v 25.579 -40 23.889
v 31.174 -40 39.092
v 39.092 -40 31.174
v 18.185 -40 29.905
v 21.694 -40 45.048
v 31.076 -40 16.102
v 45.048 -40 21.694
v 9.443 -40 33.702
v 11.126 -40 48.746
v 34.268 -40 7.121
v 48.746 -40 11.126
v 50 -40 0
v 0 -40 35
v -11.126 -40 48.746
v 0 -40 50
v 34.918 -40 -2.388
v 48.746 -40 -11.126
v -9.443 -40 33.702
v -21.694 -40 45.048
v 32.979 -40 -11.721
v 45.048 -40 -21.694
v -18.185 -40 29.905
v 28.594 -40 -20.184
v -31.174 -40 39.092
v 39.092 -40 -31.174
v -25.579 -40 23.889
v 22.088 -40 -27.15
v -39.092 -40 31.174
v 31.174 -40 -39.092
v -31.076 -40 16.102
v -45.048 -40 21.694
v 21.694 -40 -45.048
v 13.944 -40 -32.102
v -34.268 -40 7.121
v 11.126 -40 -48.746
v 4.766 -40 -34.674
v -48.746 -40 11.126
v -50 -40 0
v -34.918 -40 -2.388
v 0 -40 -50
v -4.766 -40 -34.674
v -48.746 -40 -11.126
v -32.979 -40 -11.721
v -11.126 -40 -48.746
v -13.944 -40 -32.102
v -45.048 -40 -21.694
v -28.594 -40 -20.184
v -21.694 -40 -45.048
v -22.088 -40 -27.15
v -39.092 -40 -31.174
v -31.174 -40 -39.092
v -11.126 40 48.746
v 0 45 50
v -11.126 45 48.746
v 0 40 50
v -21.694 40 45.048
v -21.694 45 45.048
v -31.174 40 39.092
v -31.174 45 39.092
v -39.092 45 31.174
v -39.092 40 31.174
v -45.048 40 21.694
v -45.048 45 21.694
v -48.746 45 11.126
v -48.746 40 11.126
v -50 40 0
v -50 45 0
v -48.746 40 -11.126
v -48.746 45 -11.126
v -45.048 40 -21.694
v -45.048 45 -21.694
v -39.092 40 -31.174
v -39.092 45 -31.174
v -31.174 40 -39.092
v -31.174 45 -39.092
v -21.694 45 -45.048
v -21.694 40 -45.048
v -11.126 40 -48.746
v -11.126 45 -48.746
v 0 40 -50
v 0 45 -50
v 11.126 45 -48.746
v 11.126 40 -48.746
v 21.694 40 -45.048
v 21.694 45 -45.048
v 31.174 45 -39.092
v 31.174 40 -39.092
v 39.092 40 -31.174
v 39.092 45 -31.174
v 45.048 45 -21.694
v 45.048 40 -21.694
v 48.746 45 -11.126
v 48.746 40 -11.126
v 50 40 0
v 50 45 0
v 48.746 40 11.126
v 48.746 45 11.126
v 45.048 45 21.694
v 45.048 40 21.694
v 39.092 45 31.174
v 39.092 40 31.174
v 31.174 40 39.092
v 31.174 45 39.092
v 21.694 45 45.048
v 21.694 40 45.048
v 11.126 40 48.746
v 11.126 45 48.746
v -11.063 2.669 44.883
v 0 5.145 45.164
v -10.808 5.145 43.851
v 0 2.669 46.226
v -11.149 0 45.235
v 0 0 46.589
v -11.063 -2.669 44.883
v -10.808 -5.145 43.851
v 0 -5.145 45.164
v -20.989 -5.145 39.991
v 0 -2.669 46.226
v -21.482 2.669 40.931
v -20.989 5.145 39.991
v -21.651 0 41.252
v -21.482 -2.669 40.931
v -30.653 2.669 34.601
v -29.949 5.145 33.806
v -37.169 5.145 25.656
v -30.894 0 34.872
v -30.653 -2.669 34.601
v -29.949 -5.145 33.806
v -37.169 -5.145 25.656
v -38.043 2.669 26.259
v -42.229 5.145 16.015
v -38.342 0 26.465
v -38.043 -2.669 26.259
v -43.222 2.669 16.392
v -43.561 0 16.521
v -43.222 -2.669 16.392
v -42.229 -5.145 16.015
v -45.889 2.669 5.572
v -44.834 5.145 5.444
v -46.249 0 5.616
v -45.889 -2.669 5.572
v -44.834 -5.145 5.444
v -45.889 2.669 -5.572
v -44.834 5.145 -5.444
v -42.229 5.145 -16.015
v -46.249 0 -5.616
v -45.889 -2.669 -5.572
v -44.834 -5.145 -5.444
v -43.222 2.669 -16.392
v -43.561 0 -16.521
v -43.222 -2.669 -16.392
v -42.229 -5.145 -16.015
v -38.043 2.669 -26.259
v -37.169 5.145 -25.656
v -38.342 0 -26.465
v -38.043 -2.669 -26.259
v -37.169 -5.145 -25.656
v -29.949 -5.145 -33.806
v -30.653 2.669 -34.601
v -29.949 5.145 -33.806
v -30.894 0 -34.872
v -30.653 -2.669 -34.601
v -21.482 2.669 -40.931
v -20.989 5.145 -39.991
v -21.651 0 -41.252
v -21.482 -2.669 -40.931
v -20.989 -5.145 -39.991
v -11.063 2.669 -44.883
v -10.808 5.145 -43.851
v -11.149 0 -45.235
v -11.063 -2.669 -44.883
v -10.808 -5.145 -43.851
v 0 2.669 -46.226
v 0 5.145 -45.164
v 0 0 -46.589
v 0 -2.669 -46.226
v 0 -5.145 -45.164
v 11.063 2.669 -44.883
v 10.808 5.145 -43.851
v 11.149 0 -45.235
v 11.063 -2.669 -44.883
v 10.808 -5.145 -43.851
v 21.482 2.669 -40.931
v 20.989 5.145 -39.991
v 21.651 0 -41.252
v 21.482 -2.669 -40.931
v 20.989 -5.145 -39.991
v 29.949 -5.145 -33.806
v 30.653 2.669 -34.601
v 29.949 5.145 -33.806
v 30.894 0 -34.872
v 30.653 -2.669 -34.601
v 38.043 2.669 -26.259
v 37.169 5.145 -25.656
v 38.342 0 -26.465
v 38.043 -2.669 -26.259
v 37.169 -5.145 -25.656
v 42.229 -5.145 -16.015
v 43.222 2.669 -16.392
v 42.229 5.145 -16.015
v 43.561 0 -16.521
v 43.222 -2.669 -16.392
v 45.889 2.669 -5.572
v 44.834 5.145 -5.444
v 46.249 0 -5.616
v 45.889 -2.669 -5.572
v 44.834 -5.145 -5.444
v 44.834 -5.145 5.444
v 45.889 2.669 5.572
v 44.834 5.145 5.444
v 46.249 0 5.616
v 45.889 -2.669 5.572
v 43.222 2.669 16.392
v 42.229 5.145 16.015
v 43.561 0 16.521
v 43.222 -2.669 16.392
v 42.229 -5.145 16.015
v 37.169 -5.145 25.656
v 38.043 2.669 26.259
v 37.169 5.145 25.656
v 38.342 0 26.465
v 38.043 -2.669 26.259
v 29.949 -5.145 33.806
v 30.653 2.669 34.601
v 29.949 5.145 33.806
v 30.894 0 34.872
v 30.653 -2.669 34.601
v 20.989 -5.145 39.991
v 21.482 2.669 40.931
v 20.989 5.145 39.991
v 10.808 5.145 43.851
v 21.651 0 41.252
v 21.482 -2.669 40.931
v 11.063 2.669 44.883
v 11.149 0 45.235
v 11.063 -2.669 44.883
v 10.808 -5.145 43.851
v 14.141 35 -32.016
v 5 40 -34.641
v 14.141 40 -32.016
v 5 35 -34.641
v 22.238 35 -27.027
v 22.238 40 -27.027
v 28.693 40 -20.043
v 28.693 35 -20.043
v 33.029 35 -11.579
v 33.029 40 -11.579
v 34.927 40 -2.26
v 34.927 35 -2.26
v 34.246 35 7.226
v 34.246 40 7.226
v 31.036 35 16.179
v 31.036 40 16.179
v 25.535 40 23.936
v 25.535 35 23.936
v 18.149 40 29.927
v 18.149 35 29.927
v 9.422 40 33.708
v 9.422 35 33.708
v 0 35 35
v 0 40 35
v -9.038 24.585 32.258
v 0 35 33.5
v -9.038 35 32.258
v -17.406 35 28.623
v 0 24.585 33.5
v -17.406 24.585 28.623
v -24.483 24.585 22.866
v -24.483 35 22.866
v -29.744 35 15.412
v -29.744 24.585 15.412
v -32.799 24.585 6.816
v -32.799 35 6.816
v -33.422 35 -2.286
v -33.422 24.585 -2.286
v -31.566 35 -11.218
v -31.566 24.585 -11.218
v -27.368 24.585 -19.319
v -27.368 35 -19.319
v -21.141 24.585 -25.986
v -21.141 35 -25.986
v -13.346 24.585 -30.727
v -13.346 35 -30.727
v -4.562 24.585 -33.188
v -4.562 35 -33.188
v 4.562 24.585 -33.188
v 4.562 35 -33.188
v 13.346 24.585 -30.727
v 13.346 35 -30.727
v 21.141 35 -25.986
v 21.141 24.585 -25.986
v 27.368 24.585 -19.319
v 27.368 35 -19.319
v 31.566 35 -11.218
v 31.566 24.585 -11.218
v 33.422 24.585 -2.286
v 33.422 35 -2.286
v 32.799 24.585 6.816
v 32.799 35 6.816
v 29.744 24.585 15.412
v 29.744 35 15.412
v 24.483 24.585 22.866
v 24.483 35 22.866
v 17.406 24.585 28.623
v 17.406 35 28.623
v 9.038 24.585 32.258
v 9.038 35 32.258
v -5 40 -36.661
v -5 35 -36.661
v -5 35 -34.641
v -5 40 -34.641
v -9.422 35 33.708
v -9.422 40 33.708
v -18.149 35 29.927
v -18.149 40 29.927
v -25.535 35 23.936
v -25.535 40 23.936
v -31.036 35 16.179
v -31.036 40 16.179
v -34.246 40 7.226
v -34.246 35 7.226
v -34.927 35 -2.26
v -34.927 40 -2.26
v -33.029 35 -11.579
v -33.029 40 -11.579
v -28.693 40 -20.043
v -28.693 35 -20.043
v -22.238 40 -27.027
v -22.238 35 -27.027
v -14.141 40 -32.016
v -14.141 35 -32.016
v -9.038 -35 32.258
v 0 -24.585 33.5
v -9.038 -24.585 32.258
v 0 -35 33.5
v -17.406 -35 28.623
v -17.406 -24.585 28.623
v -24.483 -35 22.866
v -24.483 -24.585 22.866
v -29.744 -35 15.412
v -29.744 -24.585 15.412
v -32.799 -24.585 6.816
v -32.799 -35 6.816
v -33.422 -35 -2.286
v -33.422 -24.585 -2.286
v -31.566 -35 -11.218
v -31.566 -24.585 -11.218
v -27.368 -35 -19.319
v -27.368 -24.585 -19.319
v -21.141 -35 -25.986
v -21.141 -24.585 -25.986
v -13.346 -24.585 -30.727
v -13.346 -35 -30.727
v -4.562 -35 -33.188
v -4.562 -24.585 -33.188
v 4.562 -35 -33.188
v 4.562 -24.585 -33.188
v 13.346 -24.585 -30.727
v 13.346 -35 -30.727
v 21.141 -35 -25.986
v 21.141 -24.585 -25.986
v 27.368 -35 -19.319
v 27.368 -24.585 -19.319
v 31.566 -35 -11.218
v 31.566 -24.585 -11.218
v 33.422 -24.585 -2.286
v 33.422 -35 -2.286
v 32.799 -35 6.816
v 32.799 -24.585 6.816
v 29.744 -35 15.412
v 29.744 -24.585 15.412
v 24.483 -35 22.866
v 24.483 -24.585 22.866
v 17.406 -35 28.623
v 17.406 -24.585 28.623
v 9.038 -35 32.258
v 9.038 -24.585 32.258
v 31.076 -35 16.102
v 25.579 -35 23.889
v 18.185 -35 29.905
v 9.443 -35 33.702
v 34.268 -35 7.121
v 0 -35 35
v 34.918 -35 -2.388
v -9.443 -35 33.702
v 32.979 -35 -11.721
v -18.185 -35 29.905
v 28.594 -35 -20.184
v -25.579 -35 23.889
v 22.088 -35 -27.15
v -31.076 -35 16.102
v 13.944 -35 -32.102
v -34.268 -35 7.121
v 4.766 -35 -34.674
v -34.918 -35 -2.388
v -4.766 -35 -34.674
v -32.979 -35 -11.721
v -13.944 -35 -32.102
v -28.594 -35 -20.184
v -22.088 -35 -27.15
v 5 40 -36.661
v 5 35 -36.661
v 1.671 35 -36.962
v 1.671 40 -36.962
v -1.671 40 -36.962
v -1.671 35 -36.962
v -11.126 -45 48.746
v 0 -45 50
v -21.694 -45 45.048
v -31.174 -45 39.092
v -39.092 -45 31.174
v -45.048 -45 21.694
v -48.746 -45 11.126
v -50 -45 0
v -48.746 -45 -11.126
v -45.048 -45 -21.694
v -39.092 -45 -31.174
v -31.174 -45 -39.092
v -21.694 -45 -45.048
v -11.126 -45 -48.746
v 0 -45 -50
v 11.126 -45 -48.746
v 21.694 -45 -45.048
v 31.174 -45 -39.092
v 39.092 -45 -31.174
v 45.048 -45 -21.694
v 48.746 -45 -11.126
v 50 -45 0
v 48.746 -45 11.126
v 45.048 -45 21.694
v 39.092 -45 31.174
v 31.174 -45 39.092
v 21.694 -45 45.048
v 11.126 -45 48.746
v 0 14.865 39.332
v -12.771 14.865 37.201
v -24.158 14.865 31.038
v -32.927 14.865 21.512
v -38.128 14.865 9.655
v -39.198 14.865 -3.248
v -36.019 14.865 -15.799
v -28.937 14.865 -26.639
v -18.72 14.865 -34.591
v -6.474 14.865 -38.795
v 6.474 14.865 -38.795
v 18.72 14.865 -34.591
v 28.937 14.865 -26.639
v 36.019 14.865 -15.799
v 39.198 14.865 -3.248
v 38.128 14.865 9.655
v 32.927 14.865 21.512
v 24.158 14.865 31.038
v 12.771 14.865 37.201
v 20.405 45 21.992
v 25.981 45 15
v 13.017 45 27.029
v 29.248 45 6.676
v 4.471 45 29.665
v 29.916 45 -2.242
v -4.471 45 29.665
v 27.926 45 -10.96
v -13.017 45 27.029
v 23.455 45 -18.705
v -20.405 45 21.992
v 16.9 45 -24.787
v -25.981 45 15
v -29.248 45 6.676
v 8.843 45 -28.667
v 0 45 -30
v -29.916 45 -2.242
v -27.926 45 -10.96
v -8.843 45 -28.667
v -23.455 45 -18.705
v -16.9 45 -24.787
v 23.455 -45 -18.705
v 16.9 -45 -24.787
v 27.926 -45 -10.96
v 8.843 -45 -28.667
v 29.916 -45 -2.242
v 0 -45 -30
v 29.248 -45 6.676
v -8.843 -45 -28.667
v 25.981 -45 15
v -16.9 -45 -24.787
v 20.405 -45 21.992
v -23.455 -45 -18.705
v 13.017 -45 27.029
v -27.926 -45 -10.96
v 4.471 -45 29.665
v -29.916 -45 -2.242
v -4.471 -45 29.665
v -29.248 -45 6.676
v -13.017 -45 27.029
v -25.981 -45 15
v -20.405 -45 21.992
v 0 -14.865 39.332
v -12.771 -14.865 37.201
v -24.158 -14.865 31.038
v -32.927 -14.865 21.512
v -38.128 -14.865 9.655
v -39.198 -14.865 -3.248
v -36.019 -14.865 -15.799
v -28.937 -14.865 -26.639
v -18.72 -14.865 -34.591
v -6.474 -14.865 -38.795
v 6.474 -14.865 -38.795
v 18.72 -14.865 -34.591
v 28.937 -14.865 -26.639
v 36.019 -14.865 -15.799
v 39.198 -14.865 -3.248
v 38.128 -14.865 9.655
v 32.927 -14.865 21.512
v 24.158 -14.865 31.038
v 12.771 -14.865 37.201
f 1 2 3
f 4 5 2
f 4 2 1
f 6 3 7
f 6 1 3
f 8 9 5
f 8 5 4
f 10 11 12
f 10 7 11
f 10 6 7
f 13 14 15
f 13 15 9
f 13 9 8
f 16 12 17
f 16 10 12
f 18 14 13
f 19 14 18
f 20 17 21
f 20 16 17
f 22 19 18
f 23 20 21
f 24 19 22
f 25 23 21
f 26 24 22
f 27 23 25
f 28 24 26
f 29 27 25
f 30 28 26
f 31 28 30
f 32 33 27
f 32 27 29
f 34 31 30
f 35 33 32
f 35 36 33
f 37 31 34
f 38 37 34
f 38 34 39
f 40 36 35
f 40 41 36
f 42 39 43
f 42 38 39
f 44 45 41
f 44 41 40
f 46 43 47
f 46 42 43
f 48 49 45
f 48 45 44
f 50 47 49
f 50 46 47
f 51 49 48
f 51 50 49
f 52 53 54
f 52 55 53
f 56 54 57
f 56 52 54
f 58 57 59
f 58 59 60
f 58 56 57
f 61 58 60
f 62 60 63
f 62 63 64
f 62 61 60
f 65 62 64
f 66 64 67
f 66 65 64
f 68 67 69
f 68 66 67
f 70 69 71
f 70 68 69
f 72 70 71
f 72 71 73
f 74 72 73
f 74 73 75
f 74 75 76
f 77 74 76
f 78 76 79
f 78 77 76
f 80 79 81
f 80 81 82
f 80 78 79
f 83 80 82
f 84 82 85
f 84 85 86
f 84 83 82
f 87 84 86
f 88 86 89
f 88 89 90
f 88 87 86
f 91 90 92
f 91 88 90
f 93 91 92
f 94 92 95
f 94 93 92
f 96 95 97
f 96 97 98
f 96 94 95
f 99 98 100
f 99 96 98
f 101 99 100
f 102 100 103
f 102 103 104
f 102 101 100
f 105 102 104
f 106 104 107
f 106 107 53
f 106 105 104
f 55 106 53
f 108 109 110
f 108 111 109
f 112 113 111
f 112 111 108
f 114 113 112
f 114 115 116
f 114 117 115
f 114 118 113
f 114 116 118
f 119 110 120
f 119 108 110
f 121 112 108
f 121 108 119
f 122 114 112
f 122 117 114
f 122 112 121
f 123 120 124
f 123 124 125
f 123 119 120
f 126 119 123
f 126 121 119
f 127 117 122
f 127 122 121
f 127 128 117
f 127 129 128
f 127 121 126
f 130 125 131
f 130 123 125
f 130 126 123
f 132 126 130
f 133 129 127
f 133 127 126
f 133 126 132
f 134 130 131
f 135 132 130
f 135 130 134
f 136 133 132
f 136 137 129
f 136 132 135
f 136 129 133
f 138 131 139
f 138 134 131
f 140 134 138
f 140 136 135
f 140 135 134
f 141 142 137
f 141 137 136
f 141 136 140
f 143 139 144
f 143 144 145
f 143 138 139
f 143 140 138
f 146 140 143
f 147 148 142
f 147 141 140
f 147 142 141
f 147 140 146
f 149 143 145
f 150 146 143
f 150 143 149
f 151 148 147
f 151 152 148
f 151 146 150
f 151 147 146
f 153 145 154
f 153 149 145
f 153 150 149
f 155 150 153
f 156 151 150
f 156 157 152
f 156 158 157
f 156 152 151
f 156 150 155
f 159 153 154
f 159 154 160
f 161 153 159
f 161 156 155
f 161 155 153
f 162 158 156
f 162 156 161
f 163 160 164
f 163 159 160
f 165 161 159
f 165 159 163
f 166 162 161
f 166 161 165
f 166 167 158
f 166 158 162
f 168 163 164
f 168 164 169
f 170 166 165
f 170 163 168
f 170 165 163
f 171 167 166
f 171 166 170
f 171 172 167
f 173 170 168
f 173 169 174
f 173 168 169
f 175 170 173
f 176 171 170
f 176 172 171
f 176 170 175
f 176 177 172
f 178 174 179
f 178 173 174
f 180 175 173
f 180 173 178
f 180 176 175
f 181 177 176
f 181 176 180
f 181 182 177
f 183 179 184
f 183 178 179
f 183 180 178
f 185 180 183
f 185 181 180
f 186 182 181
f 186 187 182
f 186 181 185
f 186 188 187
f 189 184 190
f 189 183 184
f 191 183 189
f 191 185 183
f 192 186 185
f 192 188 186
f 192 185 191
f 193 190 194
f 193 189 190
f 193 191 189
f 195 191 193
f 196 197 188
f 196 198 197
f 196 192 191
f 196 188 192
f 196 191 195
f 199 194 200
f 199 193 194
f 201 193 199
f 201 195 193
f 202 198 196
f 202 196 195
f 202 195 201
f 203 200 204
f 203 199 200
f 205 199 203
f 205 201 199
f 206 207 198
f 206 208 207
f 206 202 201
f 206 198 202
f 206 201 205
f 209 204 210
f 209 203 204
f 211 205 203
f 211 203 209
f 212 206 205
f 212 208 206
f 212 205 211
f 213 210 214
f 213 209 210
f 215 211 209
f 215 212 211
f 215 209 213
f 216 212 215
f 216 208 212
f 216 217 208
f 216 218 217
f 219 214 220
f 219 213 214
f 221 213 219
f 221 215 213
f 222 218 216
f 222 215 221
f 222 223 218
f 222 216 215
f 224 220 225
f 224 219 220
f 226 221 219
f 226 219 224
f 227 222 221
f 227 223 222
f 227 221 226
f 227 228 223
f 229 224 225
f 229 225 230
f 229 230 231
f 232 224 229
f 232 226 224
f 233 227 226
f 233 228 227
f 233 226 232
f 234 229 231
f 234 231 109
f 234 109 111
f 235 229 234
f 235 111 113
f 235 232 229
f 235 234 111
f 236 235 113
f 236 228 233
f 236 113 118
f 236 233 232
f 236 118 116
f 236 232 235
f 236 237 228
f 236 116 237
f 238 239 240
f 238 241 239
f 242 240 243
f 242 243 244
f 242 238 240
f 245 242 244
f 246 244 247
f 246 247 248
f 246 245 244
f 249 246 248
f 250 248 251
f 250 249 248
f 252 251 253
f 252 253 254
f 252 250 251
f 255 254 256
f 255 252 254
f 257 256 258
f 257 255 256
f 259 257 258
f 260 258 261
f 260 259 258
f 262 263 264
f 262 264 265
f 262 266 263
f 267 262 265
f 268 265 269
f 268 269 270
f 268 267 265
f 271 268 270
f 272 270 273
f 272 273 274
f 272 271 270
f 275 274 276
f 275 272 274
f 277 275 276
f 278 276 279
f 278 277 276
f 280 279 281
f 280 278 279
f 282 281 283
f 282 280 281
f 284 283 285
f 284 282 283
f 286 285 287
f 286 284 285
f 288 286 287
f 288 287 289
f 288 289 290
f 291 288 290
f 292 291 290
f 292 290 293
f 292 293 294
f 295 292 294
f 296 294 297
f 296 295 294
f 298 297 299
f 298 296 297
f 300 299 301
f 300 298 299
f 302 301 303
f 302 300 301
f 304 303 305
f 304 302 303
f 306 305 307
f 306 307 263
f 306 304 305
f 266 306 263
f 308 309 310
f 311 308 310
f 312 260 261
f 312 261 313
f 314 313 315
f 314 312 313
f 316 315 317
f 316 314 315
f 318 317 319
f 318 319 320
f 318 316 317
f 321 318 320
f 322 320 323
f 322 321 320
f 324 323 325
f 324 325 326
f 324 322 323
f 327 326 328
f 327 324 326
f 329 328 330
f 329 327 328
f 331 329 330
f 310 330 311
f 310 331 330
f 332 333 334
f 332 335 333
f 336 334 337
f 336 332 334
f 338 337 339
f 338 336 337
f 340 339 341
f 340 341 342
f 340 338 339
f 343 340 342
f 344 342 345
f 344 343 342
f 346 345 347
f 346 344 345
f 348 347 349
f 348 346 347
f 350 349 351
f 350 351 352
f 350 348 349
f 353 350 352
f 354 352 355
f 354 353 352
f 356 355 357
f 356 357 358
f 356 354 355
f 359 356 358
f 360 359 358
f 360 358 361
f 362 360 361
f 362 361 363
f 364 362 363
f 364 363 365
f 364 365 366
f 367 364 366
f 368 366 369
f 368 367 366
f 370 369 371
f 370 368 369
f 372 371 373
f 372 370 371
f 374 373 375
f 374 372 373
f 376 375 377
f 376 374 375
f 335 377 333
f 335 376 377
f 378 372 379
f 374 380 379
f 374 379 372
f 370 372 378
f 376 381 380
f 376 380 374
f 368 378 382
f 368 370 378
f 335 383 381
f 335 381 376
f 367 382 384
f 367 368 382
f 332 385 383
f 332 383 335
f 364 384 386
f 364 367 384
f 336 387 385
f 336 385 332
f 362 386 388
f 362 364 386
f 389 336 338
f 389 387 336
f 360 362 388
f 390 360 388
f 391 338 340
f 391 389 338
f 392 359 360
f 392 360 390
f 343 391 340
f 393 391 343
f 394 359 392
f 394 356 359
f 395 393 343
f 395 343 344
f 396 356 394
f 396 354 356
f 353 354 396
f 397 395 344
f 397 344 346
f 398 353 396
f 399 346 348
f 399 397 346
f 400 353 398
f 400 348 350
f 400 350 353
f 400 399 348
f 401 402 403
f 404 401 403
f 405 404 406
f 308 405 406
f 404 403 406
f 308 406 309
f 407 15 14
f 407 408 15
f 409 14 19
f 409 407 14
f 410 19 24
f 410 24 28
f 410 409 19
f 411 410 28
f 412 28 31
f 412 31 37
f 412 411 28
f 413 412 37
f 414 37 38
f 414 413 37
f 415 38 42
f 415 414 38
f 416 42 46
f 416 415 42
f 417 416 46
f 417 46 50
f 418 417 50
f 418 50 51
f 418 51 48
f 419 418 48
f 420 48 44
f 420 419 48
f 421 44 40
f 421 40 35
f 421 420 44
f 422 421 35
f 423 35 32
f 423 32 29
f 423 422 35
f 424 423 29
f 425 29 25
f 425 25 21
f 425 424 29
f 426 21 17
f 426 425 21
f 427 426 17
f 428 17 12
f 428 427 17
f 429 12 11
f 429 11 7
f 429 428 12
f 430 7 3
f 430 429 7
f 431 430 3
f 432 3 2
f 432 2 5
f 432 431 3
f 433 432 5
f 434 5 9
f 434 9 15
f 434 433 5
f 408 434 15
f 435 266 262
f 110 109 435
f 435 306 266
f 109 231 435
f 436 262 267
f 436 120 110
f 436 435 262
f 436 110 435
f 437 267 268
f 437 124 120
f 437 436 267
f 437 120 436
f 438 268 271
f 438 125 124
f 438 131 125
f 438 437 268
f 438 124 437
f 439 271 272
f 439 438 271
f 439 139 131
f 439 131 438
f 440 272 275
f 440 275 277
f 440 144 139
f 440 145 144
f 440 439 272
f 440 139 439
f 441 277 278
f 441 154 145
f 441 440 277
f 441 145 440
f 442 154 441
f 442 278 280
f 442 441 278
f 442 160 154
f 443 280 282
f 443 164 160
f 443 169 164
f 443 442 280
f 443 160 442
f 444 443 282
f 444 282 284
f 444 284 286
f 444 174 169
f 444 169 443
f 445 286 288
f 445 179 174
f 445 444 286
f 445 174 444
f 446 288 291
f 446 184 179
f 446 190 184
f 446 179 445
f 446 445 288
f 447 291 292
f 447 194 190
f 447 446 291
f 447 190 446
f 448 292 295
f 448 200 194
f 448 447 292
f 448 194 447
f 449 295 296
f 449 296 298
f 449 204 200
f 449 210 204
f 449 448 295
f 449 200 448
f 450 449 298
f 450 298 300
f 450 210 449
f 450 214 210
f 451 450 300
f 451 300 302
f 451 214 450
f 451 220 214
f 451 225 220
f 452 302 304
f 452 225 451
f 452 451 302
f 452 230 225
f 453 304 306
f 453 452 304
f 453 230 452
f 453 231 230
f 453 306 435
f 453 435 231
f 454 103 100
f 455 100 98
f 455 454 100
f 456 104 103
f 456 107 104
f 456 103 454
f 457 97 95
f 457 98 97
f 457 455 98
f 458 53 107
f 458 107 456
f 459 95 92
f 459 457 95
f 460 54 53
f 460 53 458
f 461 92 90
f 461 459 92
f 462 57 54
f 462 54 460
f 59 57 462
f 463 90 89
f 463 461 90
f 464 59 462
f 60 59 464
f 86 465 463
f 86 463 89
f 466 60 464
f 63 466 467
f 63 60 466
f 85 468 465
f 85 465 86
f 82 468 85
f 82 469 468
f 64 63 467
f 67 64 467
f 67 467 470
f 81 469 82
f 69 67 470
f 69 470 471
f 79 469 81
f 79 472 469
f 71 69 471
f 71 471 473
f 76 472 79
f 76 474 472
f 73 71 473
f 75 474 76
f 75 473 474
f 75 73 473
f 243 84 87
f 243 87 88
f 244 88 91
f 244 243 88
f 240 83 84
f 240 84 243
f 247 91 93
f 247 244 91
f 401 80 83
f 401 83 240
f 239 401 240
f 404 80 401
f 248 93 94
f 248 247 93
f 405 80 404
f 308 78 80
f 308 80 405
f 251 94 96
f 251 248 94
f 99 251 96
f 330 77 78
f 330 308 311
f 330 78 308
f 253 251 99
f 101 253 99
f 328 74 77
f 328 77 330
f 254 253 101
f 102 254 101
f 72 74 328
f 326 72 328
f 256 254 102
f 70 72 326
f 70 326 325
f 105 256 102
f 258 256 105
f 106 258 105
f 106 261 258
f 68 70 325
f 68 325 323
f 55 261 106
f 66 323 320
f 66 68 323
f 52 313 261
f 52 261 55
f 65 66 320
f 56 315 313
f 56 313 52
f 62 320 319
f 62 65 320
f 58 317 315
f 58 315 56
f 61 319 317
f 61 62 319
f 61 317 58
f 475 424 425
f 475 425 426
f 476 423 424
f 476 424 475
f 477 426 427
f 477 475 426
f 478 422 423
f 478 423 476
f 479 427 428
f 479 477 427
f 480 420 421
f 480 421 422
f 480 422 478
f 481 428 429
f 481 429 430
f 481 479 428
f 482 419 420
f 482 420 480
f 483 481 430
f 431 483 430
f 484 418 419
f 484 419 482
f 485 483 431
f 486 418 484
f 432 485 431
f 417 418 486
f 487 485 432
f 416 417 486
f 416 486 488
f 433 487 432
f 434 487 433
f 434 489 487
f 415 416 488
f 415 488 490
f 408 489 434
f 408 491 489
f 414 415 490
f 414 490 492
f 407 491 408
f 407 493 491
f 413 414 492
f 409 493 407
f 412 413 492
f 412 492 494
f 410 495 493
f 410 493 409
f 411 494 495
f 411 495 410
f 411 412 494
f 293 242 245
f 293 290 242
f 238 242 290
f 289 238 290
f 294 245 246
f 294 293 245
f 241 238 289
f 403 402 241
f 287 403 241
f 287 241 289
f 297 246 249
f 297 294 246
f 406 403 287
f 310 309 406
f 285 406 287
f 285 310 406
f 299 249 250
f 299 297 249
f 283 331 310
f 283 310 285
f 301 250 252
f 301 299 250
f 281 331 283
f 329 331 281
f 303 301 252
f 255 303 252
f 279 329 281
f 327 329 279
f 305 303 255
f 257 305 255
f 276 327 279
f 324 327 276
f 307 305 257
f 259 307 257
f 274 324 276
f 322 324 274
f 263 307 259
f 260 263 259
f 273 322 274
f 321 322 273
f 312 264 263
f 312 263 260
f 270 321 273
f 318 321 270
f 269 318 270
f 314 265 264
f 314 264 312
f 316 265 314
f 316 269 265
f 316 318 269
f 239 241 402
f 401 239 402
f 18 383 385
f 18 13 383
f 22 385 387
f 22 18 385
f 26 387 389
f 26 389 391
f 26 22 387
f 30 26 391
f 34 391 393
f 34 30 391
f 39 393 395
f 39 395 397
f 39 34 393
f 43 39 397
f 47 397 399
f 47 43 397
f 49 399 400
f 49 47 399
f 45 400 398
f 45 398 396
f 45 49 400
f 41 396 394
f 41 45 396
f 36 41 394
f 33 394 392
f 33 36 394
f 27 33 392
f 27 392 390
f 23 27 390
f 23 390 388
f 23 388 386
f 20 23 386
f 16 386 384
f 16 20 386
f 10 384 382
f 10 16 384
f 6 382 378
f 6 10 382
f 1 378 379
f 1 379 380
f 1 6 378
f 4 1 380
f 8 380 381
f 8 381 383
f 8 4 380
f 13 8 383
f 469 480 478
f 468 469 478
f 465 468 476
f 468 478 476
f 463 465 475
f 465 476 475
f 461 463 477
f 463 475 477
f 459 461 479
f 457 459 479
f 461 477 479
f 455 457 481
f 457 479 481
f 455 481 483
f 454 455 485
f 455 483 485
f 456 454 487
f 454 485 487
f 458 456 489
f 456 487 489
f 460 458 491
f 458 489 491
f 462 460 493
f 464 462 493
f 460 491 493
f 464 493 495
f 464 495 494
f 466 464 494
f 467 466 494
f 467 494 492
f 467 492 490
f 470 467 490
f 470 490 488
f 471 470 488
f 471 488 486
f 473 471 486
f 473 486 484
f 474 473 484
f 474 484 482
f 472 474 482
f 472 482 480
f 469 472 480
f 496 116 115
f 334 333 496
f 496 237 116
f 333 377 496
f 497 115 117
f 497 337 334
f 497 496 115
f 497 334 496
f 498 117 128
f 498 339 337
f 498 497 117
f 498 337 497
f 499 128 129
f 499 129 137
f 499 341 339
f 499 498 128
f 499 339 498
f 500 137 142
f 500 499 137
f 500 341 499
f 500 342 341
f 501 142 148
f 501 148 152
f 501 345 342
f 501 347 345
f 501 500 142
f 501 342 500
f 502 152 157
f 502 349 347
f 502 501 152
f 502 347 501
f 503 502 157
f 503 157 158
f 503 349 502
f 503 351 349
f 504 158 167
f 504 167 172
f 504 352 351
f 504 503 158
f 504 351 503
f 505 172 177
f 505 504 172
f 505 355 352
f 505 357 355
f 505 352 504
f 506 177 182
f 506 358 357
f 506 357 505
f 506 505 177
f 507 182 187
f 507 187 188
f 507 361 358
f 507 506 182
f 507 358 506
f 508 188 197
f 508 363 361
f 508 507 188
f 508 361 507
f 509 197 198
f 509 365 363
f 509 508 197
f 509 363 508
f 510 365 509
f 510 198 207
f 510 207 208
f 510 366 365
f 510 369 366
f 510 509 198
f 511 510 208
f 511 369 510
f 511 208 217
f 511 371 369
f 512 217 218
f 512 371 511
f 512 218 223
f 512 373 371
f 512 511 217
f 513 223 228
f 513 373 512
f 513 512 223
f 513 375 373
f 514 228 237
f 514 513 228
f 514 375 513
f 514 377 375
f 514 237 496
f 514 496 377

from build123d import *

# Parameters (mm, degrees)
BOSS_EXTRUDE1_DEPTH = 5
SKETCH4_R           = 30
CUT_EXTRUDE1_DEPTH  = 115.455231423


with BuildPart() as part:
    # Sketch1 → Revolve1 (revolve)
    with BuildSketch(Plane.XY, mode=Mode.PRIVATE) as revolve1_sk:
        with BuildLine():
            Line((0, 45), (-50, 45))
            Line((-50, 45), (-50, 40))
            Line((-50, 40), (-35, 40))
            Line((-35, 40), (-35, 35))
            Line((-35, 35), (-33.5, 35))
            Line((-33.5, 35), (-33.5, 24.584524053))
            Line((-33.5, 24.584524053), (-45.163739899, 5.144957554))
            ThreePointArc((-45.163739899, 5.144957554), (-46.588810642, 0), (-45.163739899, -5.144957554))
            Line((-45.163739899, -5.144957554), (-33.5, -24.584524053))
            Line((-33.5, -24.584524053), (-33.5, -35))
            Line((-33.5, -35), (-35, -35))
            Line((-35, -35), (-35, -40))
            Line((-35, -40), (-50, -40))
            Line((-50, -40), (-50, -45))
            Line((-50, -45), (0, -45))
            Line((0, -45), (0, 45))
        make_face()
    revolve(revolve1_sk.sketch.rotate(Axis((0, 78.93258427, 0), (0, -1, 0)), 270), axis=Axis((0, 78.93258427, 0), (0, -1, 0)))

    # Sketch2 → Boss-Extrude1 (add)
    with BuildSketch(Plane(origin=(0, 35, 0), x_dir=(1, 0, 0), z_dir=(0, 1, 0))):
        with BuildLine():
            Line((-5, 36.66060556), (-5, 34.641016151))
            ThreePointArc((-5, 34.641016151), (0, 35), (5, 34.641016151))
            Line((5, 34.641016151), (5, 36.66060556))
            ThreePointArc((5, 36.66060556), (0, 37), (-5, 36.66060556))
        make_face()
    extrude(amount=BOSS_EXTRUDE1_DEPTH)

    # Sketch4 → Cut-Extrude1 (cut, through all)
    with BuildSketch(Plane.XZ.offset(45)):
        with Locations(Location((0, 0, 0), (0, 0, 270))):
            Circle(SKETCH4_R)
    extrude(amount=-CUT_EXTRUDE1_DEPTH, mode=Mode.SUBTRACT)


solid = part.part
